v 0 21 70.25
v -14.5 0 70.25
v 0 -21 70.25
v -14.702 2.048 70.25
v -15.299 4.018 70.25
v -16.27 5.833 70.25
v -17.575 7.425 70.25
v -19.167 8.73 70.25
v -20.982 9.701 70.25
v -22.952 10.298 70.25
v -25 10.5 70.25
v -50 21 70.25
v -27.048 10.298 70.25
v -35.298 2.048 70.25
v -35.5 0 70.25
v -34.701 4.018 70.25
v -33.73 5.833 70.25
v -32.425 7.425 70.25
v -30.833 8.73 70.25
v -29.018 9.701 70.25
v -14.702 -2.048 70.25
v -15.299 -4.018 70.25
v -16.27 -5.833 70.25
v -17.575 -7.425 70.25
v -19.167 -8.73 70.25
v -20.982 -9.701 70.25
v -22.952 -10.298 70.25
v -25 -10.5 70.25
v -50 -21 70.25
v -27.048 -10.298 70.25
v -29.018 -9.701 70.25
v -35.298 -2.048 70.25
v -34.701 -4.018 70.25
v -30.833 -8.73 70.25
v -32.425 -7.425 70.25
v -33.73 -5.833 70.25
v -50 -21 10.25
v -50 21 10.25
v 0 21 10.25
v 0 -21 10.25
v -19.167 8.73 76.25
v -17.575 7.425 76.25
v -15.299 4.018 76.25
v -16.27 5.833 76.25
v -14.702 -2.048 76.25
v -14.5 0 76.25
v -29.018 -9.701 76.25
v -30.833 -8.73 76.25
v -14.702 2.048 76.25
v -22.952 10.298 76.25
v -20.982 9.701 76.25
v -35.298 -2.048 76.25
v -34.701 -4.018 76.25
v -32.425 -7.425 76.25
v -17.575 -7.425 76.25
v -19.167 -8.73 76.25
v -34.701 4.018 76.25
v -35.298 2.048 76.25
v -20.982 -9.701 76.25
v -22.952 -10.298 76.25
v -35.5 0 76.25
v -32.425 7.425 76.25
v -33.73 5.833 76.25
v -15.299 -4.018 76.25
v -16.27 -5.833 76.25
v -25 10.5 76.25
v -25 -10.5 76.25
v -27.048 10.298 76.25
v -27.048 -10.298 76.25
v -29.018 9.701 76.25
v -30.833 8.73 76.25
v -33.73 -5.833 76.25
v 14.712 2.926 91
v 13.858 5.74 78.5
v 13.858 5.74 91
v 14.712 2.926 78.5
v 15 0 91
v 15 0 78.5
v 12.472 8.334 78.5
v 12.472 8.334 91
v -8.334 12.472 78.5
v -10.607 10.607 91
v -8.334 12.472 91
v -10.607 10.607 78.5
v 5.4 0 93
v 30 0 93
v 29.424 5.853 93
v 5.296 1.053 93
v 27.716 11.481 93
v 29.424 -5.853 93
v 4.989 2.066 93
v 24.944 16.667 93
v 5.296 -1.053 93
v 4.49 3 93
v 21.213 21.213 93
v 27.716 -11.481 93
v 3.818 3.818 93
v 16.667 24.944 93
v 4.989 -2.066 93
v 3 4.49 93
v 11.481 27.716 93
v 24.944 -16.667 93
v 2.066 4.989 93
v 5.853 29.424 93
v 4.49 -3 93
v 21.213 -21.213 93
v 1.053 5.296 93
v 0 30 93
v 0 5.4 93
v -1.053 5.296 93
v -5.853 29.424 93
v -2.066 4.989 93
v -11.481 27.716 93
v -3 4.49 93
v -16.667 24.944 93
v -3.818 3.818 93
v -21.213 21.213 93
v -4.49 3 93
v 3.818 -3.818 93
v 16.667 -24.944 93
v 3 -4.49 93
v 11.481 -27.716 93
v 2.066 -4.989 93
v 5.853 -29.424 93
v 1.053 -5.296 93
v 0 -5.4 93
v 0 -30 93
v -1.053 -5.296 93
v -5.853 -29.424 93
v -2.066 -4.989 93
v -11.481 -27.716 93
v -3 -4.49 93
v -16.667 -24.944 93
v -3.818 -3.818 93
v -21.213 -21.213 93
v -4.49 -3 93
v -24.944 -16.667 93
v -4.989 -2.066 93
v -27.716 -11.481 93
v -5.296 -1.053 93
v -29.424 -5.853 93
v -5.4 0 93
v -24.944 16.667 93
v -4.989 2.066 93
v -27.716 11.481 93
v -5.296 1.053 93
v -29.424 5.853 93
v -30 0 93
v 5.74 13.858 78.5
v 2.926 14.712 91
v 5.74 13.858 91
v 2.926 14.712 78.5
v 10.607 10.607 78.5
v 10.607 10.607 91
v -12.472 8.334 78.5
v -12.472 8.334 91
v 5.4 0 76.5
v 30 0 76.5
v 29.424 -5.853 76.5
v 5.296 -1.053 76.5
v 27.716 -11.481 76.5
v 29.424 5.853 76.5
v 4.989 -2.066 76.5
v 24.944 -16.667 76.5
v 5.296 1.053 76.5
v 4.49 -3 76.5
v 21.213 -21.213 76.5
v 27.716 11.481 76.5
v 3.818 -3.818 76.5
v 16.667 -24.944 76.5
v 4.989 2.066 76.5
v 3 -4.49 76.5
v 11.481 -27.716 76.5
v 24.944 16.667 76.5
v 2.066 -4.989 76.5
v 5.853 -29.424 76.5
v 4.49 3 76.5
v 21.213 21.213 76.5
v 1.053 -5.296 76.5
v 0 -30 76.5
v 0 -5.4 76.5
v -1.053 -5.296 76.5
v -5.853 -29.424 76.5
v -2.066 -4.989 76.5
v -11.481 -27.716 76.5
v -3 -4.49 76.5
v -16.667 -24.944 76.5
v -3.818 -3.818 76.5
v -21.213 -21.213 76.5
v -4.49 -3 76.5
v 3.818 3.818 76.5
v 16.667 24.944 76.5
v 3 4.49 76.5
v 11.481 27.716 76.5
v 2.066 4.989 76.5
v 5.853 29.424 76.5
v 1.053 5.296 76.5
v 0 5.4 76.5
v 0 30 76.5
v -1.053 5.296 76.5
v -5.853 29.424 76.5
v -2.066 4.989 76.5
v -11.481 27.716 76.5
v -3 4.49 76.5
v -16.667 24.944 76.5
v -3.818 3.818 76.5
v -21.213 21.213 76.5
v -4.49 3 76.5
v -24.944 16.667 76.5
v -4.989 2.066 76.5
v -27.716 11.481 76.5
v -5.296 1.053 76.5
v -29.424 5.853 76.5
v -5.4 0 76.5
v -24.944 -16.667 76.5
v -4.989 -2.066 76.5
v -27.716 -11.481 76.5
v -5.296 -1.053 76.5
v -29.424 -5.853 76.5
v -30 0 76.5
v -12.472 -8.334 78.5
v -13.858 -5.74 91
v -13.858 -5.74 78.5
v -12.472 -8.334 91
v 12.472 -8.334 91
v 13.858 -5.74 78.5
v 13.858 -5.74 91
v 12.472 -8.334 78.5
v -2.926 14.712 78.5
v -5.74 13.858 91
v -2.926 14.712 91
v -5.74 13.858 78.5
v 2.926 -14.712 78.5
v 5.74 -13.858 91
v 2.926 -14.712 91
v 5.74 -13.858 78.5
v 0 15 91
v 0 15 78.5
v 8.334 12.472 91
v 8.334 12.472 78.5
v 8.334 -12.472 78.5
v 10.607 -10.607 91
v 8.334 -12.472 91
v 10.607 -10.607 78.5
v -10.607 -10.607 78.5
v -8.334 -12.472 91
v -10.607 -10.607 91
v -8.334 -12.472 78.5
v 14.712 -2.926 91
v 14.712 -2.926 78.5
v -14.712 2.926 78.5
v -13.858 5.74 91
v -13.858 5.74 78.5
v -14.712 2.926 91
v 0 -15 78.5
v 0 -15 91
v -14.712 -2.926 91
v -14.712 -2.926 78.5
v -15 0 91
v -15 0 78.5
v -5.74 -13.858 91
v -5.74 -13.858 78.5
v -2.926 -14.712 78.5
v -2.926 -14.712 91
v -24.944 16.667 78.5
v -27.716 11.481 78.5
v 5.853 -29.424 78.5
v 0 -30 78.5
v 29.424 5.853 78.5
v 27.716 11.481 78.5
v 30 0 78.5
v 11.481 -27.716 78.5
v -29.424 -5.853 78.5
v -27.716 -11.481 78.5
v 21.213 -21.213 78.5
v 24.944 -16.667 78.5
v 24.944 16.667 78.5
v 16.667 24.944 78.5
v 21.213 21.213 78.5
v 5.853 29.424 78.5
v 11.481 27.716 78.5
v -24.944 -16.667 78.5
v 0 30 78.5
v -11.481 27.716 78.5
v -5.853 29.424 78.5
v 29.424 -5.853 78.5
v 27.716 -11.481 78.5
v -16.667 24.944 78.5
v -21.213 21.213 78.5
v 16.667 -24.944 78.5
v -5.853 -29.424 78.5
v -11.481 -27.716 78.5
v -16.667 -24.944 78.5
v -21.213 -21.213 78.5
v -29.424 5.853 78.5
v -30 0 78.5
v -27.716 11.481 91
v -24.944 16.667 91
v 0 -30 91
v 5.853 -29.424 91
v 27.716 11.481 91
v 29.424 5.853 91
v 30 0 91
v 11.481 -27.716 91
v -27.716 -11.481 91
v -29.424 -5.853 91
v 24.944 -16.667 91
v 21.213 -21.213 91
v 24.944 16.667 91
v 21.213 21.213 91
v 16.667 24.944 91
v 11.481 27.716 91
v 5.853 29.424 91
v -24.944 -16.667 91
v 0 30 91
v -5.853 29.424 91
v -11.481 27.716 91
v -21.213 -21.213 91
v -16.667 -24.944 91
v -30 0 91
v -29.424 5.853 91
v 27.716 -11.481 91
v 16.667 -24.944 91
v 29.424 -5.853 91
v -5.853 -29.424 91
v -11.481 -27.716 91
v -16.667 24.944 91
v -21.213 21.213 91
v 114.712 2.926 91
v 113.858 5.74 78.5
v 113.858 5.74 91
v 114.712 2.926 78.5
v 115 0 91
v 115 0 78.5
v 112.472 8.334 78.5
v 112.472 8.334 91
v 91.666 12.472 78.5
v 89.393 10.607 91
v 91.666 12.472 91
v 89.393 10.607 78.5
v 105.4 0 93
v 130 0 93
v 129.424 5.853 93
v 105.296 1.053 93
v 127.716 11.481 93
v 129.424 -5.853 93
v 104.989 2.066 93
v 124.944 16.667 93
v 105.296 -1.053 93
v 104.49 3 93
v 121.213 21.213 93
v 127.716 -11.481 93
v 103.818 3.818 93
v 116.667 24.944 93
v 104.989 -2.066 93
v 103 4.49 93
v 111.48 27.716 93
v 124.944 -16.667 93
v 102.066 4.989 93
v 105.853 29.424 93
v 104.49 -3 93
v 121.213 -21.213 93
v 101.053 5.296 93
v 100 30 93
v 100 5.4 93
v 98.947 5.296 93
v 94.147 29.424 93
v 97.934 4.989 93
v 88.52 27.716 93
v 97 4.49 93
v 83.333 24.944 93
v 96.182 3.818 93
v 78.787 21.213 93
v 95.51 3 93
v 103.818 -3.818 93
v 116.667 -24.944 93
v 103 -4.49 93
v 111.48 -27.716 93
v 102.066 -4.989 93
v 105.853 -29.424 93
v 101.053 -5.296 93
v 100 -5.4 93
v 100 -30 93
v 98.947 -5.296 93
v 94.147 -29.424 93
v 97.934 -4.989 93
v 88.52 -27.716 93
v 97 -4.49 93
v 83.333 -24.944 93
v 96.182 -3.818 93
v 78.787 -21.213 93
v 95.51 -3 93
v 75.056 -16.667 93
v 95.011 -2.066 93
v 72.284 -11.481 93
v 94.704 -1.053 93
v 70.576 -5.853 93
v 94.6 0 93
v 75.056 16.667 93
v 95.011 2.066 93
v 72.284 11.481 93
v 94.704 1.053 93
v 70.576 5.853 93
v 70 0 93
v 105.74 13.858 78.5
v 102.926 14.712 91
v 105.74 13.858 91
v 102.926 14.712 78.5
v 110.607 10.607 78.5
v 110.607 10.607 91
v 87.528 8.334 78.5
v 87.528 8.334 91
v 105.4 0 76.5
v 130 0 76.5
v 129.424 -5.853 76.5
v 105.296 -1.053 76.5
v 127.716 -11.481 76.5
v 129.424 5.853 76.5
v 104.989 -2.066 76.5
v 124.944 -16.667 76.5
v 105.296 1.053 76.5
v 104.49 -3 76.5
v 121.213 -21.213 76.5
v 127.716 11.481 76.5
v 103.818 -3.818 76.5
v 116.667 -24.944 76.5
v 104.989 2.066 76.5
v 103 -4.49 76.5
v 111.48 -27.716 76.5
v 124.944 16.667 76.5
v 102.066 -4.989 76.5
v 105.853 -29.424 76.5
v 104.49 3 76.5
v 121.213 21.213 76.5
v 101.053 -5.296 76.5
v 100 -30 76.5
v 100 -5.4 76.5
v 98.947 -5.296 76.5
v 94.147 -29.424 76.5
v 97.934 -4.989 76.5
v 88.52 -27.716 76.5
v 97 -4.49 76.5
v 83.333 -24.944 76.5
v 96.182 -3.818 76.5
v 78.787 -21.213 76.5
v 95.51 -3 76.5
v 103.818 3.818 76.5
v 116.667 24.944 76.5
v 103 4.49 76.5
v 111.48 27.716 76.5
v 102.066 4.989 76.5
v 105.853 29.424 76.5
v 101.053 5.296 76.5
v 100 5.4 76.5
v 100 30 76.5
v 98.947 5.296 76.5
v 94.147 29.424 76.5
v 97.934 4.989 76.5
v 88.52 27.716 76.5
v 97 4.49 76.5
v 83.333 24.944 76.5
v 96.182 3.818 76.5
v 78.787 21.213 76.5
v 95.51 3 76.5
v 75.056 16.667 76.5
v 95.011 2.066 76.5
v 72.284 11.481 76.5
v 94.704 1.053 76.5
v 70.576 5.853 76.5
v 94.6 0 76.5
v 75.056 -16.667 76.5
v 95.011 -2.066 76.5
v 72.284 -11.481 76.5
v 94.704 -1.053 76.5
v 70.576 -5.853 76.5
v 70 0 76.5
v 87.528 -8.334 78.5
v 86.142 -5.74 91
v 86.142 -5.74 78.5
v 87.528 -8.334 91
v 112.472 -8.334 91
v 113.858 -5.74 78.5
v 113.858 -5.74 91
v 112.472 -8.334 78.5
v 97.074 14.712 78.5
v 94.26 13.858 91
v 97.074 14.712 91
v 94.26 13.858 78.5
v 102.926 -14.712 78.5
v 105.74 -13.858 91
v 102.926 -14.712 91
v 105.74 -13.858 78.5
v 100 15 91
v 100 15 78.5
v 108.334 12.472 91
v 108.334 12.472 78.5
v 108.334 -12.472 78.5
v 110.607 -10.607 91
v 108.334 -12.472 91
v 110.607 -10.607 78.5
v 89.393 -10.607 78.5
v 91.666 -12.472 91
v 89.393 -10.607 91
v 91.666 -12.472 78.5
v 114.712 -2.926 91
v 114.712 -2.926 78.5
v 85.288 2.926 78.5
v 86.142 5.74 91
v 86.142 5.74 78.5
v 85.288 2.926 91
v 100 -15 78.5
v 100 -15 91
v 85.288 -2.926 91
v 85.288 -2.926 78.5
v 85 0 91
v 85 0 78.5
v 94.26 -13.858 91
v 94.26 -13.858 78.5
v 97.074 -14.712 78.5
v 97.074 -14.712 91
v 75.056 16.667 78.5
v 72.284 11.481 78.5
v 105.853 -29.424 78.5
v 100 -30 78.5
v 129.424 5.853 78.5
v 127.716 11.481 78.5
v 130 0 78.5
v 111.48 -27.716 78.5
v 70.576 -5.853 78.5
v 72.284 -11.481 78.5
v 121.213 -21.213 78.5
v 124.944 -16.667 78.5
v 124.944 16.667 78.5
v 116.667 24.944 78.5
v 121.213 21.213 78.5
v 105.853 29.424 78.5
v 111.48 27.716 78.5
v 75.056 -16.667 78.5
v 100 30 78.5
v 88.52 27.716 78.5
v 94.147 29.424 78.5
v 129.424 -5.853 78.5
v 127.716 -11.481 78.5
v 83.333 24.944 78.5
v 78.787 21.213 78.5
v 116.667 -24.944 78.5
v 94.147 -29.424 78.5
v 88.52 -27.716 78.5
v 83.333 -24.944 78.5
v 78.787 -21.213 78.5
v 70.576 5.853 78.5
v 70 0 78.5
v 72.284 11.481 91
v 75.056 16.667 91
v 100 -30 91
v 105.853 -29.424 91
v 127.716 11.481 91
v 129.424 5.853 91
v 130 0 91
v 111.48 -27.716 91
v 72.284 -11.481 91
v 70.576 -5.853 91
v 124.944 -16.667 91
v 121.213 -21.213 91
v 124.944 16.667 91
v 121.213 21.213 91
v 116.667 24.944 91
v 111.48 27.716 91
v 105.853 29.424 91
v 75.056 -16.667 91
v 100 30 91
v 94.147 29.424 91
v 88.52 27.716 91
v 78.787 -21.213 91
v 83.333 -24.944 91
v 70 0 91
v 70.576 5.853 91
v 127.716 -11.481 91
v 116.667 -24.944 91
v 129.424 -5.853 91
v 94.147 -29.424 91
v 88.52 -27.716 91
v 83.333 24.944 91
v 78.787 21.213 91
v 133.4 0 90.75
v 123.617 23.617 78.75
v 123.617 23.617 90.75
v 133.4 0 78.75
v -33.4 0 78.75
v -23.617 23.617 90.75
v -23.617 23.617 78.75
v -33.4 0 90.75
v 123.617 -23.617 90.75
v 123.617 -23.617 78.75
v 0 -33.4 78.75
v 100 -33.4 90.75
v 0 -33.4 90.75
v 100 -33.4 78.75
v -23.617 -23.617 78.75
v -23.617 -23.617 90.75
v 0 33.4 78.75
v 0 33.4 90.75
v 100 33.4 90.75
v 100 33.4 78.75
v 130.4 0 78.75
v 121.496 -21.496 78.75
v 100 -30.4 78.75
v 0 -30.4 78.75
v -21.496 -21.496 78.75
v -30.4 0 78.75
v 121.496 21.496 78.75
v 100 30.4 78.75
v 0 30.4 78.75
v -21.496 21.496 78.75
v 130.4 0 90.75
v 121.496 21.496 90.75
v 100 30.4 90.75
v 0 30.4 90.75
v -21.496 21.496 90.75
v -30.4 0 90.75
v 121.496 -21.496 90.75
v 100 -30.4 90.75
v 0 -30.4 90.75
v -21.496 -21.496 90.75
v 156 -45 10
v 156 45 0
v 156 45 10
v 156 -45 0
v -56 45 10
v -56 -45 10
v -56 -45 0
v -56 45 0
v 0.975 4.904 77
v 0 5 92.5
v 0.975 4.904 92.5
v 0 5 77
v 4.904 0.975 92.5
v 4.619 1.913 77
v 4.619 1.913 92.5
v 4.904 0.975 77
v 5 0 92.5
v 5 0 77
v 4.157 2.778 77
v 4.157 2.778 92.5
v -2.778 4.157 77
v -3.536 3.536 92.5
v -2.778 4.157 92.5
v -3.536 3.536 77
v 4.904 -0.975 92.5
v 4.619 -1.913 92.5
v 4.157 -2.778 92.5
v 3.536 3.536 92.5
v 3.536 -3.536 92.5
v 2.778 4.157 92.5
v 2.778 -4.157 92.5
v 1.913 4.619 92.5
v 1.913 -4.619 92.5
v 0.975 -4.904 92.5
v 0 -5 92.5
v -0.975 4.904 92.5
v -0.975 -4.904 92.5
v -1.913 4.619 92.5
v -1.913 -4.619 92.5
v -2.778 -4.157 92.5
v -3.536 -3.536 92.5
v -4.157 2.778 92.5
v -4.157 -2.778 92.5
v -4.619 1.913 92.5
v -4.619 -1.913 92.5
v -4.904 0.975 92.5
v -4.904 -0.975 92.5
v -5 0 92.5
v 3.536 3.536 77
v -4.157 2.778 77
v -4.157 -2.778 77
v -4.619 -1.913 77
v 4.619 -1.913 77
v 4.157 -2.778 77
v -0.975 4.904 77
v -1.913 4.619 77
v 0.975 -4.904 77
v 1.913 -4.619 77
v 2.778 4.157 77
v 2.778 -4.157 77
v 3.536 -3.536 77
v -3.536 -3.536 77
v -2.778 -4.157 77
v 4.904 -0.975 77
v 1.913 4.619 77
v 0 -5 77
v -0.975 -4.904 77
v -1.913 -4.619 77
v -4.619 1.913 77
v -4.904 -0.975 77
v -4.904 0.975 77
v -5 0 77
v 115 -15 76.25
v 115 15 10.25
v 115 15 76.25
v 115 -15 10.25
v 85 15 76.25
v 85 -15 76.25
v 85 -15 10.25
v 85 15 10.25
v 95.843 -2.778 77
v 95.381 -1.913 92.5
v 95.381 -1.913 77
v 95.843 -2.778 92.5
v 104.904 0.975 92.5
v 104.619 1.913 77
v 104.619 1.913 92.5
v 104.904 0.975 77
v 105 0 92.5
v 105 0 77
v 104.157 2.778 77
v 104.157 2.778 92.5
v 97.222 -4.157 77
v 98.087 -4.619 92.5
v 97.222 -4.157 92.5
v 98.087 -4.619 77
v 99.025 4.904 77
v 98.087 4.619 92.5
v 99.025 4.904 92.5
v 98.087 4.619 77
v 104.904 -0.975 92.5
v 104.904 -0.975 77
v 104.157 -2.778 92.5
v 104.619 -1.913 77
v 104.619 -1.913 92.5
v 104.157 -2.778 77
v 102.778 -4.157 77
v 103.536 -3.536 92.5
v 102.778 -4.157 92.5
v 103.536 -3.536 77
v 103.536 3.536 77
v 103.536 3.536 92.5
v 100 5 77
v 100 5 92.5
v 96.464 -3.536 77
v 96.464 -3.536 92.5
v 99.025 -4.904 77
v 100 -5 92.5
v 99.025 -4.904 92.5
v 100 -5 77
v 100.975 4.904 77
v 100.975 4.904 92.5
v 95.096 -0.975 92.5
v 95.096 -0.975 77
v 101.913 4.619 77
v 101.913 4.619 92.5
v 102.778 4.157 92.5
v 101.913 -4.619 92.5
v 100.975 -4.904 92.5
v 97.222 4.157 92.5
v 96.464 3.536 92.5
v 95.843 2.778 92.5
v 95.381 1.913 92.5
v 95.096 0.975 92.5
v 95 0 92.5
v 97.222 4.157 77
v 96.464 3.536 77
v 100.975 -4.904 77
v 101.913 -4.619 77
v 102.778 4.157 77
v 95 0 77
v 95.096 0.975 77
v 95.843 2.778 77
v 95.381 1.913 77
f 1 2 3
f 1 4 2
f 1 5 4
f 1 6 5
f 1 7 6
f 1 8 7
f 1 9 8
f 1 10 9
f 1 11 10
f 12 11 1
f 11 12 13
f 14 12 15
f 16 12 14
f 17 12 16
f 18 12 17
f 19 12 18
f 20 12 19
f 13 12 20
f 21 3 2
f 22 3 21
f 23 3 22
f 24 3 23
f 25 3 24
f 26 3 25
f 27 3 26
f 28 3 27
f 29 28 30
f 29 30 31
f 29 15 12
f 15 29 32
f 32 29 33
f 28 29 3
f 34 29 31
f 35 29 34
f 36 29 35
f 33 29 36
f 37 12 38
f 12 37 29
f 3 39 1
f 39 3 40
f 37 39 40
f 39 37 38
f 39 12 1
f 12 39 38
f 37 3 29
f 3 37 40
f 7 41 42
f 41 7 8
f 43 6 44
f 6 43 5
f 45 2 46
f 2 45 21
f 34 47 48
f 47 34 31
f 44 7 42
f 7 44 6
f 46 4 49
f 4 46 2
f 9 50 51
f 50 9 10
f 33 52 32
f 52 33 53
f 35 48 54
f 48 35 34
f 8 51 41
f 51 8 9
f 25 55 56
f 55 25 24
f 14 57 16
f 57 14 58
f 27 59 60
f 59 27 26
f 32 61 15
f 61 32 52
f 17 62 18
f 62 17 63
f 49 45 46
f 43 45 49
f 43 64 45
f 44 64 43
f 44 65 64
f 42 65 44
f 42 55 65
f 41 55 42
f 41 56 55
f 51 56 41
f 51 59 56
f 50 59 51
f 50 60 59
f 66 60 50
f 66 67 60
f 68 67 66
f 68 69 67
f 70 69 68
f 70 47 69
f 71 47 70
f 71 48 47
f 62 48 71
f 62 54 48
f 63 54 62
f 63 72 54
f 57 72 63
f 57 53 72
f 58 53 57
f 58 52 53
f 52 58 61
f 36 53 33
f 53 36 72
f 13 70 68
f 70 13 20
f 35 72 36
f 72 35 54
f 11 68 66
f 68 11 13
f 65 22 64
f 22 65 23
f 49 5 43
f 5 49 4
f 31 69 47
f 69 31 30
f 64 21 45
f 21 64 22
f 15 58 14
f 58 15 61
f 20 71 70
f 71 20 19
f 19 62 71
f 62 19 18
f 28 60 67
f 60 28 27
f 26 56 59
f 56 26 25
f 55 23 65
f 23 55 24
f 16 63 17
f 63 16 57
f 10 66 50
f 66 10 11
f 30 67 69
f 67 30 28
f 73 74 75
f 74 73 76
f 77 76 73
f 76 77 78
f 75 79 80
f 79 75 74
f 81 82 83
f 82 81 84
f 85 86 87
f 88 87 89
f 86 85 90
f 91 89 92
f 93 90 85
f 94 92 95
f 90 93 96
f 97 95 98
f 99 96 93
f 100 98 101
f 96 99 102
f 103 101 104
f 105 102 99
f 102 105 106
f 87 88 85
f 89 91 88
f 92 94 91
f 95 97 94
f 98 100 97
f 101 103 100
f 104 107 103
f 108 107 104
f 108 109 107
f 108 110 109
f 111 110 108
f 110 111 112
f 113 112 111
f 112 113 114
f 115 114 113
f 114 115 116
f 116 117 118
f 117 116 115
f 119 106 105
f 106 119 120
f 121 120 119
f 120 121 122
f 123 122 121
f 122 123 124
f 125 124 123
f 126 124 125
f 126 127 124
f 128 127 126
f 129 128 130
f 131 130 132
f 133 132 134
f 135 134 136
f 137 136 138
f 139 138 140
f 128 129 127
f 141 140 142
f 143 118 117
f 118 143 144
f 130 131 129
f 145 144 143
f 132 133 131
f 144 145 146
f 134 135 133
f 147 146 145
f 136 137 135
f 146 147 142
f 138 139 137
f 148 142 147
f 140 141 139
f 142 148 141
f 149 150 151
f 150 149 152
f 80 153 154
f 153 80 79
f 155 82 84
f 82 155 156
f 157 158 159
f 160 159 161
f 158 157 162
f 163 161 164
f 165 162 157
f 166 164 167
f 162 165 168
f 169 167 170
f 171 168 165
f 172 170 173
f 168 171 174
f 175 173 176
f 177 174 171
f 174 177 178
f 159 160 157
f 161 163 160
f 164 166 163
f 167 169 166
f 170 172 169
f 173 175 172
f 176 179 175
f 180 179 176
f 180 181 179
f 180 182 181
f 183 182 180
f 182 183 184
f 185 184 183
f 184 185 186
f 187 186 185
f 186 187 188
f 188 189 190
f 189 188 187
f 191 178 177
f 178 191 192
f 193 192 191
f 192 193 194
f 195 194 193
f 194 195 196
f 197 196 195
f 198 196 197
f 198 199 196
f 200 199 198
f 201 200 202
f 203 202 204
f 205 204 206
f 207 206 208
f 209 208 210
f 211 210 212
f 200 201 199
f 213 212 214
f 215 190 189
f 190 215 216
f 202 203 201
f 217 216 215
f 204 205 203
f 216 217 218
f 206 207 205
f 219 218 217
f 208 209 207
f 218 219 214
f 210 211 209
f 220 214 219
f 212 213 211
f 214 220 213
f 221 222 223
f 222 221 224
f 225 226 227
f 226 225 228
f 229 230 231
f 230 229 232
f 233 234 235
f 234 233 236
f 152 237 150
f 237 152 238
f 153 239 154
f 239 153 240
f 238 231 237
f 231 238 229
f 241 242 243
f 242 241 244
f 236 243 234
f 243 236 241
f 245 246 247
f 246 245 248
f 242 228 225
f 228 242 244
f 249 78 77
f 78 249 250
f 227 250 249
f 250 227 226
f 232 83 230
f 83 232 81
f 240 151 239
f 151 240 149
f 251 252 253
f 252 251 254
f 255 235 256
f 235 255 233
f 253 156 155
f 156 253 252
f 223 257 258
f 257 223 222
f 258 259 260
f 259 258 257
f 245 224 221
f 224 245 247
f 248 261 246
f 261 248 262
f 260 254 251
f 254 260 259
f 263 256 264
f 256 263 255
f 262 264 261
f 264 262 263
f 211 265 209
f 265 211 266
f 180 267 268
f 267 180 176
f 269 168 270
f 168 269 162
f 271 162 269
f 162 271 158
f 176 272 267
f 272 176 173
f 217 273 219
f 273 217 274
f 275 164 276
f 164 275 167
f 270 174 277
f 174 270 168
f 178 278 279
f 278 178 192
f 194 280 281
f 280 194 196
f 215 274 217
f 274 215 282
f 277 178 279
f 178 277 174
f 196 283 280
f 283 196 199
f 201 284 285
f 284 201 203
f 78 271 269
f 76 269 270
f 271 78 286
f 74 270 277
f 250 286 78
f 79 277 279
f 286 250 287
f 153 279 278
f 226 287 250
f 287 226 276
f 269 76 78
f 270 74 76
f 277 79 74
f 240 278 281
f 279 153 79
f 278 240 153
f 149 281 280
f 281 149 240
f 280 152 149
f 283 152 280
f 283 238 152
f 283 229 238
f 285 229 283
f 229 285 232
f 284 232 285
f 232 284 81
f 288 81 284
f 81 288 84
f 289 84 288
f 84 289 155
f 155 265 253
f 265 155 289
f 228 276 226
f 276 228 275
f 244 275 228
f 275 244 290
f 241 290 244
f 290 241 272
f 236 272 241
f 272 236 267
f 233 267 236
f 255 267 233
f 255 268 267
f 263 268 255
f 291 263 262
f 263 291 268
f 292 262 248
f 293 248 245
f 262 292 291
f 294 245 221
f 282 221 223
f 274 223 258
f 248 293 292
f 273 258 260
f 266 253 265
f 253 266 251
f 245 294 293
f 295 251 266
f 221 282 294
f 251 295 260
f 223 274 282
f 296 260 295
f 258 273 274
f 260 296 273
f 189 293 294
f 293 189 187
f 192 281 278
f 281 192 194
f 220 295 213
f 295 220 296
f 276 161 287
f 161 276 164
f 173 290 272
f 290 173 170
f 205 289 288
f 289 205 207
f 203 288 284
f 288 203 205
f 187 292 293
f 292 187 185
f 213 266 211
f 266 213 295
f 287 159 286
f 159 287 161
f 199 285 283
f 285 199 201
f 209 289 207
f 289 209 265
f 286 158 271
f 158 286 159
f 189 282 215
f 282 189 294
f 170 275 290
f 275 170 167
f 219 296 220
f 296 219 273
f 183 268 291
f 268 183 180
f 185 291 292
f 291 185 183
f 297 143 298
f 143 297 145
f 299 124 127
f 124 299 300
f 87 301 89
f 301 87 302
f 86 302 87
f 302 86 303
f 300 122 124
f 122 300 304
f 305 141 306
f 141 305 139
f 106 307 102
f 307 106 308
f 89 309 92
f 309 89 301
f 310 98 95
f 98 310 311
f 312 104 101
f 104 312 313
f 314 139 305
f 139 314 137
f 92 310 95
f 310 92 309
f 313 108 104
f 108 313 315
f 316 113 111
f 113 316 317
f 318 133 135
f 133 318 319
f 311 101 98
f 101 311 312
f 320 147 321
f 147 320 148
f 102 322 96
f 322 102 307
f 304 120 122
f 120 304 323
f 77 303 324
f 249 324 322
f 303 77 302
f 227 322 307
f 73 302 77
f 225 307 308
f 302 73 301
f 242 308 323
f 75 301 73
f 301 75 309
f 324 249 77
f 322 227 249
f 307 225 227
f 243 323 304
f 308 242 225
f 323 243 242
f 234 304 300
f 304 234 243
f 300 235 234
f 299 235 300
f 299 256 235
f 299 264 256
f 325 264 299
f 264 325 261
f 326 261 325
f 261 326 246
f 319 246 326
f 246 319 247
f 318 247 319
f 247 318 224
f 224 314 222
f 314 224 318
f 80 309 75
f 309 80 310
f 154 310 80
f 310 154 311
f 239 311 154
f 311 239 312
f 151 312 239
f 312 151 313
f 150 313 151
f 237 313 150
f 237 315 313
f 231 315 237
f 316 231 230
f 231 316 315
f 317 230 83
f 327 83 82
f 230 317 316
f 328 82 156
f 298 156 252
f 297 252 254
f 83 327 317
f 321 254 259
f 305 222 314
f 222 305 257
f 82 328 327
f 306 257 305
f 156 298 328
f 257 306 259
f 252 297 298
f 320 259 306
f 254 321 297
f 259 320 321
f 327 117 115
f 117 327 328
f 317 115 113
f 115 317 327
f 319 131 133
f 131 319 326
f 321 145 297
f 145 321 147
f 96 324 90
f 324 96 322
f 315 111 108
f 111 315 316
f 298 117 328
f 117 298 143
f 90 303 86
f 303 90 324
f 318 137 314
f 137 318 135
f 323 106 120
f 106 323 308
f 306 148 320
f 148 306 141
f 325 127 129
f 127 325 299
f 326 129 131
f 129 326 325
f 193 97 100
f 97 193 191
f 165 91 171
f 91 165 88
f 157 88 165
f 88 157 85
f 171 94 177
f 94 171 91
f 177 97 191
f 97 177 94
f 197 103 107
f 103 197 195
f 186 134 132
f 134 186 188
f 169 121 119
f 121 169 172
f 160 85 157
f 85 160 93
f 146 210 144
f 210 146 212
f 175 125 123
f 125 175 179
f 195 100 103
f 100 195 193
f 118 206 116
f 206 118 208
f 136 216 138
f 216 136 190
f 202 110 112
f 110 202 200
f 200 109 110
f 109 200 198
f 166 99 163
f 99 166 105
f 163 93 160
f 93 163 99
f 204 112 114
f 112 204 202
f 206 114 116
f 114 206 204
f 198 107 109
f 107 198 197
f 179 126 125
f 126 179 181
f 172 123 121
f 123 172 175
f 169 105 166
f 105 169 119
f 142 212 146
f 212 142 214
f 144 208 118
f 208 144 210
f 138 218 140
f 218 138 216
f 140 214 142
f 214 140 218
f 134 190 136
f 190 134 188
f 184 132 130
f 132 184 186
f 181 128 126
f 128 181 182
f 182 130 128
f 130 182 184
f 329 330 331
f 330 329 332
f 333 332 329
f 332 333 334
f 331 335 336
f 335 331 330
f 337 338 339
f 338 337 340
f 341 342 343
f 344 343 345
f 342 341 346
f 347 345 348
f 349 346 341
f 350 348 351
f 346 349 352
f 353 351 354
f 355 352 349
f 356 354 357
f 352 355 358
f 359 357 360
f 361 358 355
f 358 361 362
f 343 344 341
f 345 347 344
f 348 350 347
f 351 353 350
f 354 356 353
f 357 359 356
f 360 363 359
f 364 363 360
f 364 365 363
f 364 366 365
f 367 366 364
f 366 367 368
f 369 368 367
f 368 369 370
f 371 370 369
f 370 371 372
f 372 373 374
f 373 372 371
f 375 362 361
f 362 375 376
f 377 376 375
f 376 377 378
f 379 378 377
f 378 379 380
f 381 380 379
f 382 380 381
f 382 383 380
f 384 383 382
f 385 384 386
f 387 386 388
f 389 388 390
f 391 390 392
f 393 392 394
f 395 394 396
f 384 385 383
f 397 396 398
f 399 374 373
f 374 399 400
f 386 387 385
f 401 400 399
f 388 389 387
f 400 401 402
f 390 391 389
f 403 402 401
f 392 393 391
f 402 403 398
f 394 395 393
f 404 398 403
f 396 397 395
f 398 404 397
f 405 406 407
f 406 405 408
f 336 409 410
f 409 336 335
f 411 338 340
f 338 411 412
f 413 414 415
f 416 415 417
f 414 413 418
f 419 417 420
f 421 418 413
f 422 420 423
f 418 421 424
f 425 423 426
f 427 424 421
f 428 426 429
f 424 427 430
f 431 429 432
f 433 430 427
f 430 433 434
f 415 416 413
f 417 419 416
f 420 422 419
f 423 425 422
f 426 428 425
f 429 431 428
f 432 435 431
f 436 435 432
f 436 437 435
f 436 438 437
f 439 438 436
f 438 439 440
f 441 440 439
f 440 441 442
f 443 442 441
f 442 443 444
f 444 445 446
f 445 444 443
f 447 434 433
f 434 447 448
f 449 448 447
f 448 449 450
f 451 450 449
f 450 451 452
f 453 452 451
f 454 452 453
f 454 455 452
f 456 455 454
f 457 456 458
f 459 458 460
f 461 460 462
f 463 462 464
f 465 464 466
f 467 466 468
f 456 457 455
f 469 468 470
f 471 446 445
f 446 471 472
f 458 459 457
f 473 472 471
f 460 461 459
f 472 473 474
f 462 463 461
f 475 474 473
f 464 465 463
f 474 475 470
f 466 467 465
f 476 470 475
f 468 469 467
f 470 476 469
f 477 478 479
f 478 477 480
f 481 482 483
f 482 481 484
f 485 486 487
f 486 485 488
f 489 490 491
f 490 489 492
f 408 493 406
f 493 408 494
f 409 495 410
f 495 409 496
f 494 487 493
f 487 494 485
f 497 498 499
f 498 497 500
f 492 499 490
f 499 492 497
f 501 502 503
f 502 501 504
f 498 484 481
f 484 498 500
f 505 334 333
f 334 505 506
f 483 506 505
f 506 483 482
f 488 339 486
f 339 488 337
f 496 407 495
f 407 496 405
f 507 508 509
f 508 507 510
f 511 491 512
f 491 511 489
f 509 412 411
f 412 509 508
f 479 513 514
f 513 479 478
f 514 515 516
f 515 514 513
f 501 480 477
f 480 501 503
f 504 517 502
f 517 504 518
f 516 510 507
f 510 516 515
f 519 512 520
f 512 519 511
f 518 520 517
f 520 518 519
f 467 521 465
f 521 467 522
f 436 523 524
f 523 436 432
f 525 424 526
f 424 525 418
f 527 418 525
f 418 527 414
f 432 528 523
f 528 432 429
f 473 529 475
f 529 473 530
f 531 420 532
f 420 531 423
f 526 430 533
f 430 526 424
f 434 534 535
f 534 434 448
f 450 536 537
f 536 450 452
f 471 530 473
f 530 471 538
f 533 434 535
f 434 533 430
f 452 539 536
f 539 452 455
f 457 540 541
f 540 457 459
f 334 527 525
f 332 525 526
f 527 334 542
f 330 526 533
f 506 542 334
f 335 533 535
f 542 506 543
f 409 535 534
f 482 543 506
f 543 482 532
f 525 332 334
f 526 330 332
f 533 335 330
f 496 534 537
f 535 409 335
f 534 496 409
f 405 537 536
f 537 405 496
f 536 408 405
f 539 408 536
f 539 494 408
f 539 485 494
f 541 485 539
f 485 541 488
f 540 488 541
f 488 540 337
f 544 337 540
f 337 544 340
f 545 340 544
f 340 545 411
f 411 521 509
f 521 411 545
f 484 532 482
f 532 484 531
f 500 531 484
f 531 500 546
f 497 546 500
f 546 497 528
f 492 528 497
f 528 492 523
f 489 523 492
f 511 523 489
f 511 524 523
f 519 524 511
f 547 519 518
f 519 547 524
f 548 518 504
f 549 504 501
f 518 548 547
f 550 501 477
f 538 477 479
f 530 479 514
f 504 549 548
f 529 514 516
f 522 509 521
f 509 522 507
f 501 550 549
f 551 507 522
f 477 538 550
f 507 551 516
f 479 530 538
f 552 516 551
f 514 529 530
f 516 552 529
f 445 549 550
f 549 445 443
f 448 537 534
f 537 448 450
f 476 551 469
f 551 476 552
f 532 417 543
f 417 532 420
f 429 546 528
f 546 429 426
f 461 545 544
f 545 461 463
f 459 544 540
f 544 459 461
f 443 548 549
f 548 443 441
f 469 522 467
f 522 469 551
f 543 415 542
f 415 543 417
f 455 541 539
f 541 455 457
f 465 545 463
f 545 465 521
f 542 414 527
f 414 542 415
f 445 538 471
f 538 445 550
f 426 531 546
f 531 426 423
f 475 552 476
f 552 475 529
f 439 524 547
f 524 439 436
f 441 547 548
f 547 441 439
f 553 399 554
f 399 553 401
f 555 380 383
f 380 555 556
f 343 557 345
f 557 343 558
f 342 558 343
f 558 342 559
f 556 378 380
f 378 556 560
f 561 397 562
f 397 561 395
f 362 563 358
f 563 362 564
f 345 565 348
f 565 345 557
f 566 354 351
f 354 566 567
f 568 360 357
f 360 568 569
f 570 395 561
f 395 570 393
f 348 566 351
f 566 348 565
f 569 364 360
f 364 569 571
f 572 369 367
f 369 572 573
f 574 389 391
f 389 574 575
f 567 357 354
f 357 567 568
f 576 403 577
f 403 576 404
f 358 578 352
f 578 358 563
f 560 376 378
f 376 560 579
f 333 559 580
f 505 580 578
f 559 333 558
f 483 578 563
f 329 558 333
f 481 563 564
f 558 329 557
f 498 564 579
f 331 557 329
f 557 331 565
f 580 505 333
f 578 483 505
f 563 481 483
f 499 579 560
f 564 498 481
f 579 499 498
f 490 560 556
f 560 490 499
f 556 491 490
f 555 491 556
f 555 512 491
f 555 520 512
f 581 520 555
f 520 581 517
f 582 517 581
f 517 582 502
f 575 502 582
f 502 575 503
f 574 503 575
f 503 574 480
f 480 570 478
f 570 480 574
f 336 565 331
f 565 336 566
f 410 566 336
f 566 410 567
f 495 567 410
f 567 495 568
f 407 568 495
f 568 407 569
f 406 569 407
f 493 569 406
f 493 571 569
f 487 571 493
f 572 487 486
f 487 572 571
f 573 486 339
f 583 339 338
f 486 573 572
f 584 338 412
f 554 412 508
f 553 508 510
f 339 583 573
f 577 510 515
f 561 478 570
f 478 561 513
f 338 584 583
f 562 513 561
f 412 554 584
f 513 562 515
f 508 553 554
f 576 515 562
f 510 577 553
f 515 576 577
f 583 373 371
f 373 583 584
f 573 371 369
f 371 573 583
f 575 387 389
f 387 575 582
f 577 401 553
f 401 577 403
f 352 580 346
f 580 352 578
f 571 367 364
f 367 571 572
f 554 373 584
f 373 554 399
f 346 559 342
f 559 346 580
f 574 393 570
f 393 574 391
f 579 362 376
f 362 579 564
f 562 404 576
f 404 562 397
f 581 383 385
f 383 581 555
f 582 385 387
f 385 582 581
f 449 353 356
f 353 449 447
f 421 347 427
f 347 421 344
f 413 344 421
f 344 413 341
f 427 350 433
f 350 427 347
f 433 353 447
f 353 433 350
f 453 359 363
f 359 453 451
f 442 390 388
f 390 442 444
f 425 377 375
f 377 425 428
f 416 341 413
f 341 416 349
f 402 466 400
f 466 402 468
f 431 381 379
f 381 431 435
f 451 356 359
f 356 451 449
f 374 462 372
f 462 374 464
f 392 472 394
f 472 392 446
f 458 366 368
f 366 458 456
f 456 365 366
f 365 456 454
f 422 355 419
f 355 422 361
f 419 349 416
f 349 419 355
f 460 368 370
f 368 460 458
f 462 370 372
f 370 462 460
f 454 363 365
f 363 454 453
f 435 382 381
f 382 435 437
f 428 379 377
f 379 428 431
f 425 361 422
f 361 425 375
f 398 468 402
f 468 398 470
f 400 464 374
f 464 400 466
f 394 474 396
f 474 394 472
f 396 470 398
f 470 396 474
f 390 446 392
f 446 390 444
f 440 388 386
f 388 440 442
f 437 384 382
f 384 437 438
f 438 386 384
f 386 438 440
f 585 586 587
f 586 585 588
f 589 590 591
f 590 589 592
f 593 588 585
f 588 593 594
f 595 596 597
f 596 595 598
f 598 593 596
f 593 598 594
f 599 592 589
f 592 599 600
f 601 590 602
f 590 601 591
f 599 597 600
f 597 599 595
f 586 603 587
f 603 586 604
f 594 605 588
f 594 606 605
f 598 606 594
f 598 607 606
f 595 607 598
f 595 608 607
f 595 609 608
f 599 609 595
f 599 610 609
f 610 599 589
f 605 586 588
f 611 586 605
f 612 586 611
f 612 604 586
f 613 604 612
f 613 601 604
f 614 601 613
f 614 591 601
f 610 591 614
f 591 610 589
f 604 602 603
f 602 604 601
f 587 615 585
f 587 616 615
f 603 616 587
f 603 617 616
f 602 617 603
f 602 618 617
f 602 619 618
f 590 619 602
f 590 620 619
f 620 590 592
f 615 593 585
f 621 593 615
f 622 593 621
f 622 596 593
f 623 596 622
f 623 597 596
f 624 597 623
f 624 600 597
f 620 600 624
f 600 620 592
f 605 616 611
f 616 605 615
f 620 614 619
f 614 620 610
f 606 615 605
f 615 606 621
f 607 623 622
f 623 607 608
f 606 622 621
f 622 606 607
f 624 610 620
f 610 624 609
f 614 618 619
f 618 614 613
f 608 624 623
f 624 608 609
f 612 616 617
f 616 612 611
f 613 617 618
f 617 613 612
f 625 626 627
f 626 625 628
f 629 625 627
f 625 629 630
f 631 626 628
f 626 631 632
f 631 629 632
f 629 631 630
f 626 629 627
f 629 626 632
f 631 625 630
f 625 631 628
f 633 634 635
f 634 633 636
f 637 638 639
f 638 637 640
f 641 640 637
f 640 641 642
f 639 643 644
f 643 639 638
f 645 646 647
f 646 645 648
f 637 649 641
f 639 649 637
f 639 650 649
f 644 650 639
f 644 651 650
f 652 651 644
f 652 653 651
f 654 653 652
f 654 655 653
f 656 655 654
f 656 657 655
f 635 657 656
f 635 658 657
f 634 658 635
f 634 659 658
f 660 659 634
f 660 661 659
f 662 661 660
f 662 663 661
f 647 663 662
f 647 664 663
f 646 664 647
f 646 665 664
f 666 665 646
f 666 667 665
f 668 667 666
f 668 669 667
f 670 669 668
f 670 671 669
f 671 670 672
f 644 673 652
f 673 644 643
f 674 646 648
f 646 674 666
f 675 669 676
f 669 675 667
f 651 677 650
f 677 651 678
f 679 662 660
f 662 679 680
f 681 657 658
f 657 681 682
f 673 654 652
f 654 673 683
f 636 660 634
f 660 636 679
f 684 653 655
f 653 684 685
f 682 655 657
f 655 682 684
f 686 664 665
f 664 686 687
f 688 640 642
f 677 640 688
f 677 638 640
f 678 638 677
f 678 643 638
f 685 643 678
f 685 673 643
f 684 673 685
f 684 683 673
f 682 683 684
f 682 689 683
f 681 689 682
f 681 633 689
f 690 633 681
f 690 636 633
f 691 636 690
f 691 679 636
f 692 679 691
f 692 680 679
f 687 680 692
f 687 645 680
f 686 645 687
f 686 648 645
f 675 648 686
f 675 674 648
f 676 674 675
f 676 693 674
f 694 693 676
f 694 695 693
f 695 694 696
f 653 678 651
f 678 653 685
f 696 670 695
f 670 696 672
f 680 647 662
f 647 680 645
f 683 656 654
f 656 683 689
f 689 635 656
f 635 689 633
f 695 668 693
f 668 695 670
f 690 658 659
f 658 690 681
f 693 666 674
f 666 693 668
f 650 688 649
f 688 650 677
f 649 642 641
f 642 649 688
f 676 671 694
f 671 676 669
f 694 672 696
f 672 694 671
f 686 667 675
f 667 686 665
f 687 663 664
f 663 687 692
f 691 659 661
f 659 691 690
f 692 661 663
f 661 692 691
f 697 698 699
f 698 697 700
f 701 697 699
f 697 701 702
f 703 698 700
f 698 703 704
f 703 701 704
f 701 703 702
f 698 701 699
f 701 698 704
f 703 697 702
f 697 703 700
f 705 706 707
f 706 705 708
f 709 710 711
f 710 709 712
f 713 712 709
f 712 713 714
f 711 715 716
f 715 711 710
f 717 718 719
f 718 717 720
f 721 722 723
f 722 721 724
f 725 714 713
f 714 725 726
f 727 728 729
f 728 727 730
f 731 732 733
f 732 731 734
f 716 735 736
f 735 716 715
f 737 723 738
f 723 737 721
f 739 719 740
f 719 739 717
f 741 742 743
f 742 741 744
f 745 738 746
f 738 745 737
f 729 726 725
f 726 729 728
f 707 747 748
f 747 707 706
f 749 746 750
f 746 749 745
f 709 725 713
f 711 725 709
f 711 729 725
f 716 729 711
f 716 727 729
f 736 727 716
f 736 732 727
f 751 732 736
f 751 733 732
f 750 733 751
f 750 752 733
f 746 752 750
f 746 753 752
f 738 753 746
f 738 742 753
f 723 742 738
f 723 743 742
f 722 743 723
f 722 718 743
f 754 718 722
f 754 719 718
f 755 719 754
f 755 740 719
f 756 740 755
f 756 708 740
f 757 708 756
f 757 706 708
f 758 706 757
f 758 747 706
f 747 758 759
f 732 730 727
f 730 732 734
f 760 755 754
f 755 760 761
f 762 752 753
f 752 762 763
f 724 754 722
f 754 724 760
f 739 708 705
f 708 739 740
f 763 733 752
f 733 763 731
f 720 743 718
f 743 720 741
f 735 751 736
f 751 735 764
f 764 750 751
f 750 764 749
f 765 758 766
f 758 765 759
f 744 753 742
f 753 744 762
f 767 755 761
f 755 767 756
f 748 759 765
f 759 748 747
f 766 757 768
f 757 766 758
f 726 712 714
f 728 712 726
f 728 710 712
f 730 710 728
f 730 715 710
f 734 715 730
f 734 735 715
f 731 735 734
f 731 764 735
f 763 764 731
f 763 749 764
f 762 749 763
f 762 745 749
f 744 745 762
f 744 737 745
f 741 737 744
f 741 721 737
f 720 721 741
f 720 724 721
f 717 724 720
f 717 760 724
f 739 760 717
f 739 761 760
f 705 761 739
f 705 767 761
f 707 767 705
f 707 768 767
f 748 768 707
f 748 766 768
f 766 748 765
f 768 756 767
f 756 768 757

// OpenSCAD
$fn = 32;

// ------------------------------------------------------------------------
// Motor belt drive: span 100 mm, pulleys d60, belt 12 mm wide
// Every part is its own module, assembly() places every instance.
// ------------------------------------------------------------------------

// --- part 1 ---
module base_plate() {
  difference() {
    translate([-106, -45, 0]) cube([212, 90, 10]);
  }
}

// --- part 2 ---
module motor() {
  union() {
    translate([-30, -21, 0]) cube([60, 42, 50]);
    translate([33, 0, 25]) rotate([0, 90, 0]) cylinder(h = 6, d = 21, center = true);
  }
}

// --- part 3 ---
module drive_shaft() {
  translate([0, 0, -7.75]) cylinder(h = 15.5, d = 10);
}

// --- part 4 ---
module pulley_drive() {
  difference() {
    union() {
      cylinder(h = 16.5, d = 30);
      cylinder(h = 2, d = 60);
      translate([0, 0, 14.5]) cylinder(h = 2, d = 60);
    }
    translate([0, 0, -1]) cylinder(h = 18.5, d = 10.8);
  }
}

// --- part 5 ---
module idler_post() {
  translate([-15, -15, 0]) cube([30, 30, 66]);
}

// --- part 6 ---
module driven_shaft() {
  translate([0, 0, -7.75]) cylinder(h = 15.5, d = 10);
}

// --- part 7 ---
module pulley_driven() {
  difference() {
    union() {
      cylinder(h = 16.5, d = 30);
      cylinder(h = 2, d = 60);
      translate([0, 0, 14.5]) cylinder(h = 2, d = 60);
    }
    translate([0, 0, -1]) cylinder(h = 18.5, d = 10.8);
  }
}

// --- part 8 ---
module drive_belt() {
  difference() {
    linear_extrude(height = 12) polygon(points = concat([for (a = [90 : 45 : 270]) [33.4 * cos(a), 33.4 * sin(a)]], [for (a = [270 : 45 : 450]) [100 + 33.4 * cos(a), 33.4 * sin(a)]]));
    translate([0, 0, -1]) linear_extrude(height = 14) polygon(points = concat([for (a = [90 : 45 : 270]) [30.4 * cos(a), 30.4 * sin(a)]], [for (a = [270 : 45 : 450]) [100 + 30.4 * cos(a), 30.4 * sin(a)]]));
  }
}

// --- assembly ---
module assembly() {
  color([0.80, 0.24, 0.20]) translate([50, 0, 0]) rotate([0, 0, 0]) base_plate();
  color([0.20, 0.45, 0.75]) translate([0, 0, 40.25]) rotate([0, 270, 0]) motor();
  color([0.25, 0.62, 0.32]) translate([0, 0, 84.75]) rotate([0, 0, 0]) drive_shaft();
  color([0.92, 0.70, 0.18]) translate([0, 0, 76.5]) rotate([0, 0, 0]) pulley_drive();
  color([0.58, 0.35, 0.70]) translate([100, 0, 10.25]) rotate([0, 0, 0]) idler_post();
  color([0.16, 0.66, 0.66]) translate([100, 0, 84.75]) rotate([0, 0, 0]) driven_shaft();
  color([0.85, 0.48, 0.18]) translate([100, 0, 76.5]) rotate([0, 0, 0]) pulley_driven();
  color([0.55, 0.60, 0.65]) translate([0, 0, 78.75]) rotate([0, 0, 0]) drive_belt();
}

assembly();
